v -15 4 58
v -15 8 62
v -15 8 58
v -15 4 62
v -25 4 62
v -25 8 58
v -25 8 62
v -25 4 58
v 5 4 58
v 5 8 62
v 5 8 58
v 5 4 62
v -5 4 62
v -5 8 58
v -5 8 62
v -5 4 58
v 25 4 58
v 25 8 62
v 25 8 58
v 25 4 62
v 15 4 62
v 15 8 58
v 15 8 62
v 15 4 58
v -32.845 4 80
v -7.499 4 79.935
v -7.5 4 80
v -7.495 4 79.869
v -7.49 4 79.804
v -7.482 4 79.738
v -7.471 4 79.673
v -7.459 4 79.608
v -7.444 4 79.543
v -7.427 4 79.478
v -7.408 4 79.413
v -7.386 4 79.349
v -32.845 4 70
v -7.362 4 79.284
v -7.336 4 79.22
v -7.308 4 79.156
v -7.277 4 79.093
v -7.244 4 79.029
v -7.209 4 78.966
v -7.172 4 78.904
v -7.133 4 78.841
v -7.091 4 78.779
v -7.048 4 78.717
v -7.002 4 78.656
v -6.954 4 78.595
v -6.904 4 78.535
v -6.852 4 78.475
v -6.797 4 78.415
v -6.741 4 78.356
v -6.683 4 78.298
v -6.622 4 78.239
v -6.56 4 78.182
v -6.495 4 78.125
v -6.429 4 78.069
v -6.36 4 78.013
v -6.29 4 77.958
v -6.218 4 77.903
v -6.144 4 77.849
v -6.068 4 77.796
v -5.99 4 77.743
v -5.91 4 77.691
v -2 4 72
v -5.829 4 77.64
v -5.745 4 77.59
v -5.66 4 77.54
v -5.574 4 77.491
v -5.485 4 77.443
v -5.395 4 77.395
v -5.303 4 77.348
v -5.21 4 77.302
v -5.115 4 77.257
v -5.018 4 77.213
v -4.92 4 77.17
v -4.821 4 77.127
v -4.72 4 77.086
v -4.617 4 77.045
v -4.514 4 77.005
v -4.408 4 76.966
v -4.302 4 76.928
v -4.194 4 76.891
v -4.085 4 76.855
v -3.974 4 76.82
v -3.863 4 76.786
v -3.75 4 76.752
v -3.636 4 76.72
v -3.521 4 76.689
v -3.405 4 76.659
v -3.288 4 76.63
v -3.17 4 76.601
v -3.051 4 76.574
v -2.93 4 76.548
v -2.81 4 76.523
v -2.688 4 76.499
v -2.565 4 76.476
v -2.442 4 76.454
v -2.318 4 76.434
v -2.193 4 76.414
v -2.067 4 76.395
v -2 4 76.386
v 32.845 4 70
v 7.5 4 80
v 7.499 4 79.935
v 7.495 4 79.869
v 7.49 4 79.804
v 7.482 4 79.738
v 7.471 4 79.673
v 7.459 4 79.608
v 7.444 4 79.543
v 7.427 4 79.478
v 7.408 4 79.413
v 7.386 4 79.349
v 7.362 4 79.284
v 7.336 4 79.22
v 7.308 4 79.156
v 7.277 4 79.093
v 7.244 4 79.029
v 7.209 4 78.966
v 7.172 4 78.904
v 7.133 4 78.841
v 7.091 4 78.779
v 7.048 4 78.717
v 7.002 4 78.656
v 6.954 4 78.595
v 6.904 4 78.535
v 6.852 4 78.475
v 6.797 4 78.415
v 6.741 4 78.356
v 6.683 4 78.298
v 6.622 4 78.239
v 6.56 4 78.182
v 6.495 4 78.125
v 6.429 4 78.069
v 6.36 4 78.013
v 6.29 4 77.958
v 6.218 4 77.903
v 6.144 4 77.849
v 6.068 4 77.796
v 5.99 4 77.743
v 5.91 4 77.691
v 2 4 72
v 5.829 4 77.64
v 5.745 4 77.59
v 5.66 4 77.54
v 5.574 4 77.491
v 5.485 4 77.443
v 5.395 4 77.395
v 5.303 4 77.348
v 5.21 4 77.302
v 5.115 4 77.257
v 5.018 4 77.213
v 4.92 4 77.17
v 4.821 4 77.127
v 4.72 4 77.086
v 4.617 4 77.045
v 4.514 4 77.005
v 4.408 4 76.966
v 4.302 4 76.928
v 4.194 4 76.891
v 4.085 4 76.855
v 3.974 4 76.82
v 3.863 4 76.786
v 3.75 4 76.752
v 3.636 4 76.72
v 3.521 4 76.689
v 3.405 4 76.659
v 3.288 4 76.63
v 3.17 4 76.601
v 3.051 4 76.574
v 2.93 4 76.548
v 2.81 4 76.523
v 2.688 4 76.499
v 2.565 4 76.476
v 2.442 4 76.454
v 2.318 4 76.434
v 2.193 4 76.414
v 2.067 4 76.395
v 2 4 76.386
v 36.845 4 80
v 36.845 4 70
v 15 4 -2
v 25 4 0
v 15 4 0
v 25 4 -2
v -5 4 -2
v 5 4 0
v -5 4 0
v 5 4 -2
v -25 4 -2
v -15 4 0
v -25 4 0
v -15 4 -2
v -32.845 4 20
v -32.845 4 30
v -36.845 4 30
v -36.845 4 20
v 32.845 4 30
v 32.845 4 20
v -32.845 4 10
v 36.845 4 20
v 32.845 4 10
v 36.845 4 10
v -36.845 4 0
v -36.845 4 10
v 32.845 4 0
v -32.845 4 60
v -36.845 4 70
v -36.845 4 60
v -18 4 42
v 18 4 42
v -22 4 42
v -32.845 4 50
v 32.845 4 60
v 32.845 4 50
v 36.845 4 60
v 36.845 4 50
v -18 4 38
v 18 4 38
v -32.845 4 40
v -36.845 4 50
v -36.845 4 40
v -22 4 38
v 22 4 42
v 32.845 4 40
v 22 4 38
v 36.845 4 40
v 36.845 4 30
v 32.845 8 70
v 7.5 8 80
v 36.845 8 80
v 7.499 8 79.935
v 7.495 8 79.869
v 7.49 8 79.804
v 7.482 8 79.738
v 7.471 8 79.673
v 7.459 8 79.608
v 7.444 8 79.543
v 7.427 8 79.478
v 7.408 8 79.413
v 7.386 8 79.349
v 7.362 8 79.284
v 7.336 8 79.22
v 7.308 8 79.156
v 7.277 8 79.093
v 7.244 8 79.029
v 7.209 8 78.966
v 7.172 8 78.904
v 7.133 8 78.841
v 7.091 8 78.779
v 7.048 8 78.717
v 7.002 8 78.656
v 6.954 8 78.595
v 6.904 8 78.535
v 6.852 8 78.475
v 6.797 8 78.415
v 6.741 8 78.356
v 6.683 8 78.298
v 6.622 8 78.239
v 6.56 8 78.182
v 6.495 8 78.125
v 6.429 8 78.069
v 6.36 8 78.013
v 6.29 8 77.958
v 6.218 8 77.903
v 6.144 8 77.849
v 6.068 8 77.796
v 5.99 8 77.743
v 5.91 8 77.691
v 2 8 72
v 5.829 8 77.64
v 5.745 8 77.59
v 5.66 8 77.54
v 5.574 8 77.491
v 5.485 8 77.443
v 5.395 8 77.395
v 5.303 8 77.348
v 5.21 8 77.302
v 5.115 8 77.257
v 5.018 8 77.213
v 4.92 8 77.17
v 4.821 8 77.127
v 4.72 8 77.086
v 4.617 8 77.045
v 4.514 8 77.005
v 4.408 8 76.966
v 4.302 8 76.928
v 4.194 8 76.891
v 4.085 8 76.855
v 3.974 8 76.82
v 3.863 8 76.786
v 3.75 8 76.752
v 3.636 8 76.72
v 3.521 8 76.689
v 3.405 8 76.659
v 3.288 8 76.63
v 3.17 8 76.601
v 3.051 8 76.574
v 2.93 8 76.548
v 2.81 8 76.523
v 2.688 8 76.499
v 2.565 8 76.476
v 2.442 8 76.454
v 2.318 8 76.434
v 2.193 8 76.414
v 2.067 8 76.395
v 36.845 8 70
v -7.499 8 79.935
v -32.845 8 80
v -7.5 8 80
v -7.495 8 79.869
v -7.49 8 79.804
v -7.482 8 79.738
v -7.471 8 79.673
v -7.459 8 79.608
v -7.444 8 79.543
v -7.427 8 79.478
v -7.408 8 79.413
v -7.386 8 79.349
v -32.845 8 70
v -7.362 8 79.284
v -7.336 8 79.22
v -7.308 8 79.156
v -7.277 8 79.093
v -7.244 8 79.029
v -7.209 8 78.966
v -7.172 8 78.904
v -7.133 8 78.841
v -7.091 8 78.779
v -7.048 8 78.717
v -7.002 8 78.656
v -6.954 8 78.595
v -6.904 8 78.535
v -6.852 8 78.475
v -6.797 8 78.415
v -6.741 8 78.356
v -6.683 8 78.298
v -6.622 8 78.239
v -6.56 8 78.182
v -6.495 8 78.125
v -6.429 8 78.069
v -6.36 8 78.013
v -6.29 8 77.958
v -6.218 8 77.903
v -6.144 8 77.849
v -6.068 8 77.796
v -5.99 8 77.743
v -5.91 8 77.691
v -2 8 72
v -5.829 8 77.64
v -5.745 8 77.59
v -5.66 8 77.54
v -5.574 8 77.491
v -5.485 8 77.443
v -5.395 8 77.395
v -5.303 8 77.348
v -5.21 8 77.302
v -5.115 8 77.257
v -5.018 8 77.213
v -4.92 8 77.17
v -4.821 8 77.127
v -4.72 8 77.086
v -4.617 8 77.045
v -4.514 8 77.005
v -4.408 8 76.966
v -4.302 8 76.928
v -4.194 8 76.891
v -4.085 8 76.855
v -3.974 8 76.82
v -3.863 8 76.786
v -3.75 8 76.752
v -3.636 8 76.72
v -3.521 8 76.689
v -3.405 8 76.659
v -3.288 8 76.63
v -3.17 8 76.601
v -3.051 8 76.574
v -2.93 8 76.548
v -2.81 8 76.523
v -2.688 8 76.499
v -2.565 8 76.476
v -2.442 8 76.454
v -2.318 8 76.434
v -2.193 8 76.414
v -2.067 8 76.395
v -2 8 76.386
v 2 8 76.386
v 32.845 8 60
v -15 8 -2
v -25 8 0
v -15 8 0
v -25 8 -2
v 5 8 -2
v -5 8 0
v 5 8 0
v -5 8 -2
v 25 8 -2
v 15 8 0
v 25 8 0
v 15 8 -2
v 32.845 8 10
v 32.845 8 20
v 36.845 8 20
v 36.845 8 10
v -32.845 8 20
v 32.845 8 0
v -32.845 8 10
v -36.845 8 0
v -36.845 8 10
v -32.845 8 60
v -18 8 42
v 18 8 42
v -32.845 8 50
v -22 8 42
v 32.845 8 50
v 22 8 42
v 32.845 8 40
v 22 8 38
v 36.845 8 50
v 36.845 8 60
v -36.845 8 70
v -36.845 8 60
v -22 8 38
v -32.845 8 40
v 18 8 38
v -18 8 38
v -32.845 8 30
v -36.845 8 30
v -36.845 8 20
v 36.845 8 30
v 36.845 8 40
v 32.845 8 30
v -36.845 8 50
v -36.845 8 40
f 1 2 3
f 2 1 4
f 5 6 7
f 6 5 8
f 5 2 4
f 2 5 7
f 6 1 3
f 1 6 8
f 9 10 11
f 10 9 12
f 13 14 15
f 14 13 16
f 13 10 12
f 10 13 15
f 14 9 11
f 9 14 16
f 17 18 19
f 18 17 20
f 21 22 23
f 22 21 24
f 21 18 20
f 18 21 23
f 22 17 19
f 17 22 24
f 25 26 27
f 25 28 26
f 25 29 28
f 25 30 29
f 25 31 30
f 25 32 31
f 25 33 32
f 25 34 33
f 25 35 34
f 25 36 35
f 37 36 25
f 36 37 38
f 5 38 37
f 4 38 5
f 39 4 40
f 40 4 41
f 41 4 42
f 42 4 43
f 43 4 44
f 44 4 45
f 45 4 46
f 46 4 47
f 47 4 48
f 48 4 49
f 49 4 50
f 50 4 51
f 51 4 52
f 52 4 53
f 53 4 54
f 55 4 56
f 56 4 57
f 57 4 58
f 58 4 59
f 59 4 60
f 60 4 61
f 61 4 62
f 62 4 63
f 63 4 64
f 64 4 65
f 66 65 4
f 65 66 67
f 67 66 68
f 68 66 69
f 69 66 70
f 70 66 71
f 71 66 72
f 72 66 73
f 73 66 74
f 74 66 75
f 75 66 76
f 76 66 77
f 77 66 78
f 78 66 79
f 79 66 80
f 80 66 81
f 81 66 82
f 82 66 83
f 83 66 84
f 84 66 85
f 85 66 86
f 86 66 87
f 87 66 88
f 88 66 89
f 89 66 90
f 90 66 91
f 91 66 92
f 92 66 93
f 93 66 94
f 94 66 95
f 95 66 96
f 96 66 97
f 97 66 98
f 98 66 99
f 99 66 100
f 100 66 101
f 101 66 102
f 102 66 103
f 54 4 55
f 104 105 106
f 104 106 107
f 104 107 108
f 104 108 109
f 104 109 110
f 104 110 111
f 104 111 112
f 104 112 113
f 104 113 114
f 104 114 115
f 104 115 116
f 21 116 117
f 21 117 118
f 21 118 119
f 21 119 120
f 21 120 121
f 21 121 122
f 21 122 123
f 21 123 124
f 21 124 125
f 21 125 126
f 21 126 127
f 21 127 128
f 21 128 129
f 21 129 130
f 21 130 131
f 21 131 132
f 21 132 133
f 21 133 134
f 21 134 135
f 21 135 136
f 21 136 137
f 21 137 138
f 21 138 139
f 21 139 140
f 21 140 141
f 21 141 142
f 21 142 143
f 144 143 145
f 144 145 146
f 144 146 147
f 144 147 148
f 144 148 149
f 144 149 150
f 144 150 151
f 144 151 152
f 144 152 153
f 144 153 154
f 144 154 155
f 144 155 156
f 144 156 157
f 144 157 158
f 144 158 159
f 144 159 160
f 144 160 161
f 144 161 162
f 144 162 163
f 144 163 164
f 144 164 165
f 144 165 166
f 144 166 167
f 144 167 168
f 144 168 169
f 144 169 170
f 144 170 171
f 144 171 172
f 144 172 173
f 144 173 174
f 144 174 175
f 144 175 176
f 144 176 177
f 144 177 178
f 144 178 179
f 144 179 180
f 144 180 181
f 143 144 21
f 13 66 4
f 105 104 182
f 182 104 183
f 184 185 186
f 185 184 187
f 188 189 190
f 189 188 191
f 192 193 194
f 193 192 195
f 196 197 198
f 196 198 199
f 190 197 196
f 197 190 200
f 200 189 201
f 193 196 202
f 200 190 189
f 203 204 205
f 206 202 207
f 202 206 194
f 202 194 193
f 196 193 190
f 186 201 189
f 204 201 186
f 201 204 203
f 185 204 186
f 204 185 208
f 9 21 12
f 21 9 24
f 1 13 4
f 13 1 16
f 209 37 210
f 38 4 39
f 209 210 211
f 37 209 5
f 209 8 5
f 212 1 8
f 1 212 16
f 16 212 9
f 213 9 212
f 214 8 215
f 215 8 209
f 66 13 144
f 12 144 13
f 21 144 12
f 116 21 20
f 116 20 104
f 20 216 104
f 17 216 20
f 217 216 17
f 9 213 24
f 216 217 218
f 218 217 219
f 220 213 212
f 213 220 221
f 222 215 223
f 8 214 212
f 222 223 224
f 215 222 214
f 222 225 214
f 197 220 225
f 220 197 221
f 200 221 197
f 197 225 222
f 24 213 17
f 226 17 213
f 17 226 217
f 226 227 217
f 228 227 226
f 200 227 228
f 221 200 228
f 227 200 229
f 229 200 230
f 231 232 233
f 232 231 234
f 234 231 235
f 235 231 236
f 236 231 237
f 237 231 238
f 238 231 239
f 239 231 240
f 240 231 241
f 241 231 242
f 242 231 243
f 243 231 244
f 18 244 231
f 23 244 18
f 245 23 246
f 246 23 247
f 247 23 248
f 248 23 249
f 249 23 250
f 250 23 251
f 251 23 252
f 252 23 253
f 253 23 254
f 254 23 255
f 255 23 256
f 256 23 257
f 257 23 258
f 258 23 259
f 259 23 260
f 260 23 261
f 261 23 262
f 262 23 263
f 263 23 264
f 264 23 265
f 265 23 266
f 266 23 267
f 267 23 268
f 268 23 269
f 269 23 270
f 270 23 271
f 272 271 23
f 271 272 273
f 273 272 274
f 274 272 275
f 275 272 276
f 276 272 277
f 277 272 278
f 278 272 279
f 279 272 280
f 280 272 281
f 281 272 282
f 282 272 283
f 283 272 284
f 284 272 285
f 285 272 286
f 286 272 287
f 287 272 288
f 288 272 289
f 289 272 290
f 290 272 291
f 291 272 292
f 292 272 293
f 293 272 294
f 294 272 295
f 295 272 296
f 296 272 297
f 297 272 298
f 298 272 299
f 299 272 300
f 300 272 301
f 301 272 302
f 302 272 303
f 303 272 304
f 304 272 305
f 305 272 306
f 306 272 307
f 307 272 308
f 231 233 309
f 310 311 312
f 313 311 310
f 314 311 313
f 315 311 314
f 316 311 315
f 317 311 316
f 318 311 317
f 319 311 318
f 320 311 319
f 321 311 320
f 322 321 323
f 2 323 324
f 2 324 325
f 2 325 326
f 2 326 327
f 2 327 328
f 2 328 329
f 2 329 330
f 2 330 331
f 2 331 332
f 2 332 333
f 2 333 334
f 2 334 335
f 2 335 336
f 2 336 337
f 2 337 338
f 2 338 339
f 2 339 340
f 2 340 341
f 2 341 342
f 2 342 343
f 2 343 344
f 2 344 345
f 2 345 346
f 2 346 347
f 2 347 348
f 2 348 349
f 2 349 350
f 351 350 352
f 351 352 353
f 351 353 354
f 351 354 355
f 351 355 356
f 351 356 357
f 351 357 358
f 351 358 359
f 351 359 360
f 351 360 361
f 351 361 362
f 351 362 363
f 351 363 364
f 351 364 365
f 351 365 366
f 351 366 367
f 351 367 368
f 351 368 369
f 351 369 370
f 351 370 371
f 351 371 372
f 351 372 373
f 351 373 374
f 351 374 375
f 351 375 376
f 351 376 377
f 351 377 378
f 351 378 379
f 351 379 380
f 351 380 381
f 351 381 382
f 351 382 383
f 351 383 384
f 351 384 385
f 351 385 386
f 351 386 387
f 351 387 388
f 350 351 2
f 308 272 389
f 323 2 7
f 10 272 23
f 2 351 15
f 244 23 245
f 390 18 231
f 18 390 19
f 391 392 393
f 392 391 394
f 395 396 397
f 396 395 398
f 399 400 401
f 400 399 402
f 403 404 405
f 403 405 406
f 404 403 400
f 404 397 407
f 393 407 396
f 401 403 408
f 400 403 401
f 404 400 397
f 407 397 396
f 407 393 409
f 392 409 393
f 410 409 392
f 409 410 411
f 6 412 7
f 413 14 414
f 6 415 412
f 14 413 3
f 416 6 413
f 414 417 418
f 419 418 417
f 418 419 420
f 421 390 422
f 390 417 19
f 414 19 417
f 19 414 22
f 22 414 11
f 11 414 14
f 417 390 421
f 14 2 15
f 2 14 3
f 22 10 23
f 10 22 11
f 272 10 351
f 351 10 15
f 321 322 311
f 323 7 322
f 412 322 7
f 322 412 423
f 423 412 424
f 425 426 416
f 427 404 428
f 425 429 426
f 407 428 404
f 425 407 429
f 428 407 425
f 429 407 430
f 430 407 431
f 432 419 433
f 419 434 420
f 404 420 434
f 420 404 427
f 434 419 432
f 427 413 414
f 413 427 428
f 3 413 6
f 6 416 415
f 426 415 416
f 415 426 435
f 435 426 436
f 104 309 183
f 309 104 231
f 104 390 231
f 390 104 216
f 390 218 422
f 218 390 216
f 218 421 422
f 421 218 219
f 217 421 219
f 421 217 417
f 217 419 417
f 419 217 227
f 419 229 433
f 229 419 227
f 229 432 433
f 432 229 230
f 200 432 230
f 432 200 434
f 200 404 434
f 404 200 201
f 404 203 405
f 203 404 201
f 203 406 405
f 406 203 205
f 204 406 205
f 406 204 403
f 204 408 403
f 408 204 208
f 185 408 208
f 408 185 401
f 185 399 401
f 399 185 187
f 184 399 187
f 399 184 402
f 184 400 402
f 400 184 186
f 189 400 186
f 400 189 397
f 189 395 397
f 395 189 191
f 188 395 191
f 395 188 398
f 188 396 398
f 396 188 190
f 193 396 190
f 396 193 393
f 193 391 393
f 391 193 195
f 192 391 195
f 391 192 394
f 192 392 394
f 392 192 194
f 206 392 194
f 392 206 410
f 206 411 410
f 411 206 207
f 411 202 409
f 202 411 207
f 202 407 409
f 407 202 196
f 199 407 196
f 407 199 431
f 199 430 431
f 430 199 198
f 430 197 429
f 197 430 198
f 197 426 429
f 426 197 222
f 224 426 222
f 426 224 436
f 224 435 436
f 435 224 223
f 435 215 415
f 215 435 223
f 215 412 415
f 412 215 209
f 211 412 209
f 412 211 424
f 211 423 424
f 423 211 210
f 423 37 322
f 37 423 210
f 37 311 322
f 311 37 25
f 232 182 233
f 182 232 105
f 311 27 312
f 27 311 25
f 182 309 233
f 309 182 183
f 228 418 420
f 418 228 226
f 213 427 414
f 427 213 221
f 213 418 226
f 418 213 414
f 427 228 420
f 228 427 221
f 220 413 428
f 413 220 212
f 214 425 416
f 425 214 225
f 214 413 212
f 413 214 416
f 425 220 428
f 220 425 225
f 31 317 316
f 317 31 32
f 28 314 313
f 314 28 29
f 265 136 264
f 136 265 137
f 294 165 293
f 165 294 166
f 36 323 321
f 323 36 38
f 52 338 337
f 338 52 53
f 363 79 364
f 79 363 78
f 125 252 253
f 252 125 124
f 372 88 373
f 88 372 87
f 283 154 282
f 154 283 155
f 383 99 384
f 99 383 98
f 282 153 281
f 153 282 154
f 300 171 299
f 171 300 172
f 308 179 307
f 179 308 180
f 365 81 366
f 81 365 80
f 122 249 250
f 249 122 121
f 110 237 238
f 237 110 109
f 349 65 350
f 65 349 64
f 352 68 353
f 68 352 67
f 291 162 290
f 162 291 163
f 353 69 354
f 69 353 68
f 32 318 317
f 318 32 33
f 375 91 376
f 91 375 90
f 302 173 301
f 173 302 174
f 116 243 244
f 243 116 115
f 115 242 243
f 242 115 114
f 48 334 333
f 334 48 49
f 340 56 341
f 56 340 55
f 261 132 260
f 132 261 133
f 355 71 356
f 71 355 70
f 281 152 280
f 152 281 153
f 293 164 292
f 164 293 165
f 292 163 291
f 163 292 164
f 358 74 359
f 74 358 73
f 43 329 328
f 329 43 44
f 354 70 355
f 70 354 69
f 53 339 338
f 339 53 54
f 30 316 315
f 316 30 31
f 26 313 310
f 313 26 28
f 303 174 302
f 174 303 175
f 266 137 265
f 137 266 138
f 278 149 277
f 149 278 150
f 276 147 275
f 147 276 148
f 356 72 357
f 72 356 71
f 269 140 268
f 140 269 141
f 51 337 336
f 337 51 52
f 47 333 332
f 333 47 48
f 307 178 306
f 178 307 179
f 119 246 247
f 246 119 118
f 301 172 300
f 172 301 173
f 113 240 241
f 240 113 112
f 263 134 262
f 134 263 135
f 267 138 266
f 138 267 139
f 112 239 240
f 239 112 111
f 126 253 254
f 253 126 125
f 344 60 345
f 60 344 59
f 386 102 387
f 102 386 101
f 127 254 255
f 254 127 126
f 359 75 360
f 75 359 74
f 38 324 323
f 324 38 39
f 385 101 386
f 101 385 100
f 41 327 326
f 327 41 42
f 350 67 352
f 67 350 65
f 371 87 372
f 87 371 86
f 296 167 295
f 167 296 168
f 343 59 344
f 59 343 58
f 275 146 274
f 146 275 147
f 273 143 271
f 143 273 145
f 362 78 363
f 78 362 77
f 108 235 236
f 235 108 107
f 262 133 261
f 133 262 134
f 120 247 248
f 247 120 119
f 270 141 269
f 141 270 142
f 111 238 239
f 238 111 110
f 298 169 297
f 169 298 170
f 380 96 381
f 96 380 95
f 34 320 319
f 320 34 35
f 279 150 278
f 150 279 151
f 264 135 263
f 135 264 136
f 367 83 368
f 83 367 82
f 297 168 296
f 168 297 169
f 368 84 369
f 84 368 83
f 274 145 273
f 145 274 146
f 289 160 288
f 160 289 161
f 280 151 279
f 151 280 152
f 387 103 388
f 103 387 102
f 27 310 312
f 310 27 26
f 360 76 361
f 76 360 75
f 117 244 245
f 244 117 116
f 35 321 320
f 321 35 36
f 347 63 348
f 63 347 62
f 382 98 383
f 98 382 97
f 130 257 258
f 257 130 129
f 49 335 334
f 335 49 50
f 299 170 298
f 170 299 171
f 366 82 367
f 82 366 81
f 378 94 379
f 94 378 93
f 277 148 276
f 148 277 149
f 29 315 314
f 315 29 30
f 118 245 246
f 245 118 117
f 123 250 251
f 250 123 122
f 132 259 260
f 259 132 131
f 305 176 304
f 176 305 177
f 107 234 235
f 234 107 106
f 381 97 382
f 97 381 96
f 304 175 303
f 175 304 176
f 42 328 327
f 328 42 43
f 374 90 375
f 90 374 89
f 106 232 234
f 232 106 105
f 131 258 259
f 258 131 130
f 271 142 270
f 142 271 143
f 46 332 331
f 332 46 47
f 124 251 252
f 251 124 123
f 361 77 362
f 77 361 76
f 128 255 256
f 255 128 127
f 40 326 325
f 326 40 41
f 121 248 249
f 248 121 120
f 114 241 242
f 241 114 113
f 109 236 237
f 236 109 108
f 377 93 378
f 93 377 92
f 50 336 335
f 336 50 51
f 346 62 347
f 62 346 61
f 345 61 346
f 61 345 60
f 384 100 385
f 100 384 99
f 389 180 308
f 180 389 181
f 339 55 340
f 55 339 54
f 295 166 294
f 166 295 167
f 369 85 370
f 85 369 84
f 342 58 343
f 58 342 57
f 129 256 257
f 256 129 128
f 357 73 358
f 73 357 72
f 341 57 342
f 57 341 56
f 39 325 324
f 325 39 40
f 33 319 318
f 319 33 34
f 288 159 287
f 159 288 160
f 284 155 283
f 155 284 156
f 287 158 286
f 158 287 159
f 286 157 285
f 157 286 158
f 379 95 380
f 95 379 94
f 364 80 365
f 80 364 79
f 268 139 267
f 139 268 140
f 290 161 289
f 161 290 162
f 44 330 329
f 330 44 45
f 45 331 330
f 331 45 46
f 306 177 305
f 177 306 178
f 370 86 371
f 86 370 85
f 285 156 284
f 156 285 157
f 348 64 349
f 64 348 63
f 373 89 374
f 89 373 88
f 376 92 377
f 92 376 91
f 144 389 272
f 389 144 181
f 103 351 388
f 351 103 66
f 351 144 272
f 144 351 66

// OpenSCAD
/* 
 * Stackenlichten-Files I: The top plate
 *
 * kellertuer, 2017-02-19
 */

/*
 * Variables, all Data in mm
 */
wW = 4;    // Thickness/Width of wood
mW = 4;    //                 of a Magnet-Cube
fW = 2;    // Thickness of the front plastic plate
sL = 80;   // sidelength of a triangle
bD = 80;   // Depth of a box (depth w.r.t. frontview)
fC = 3;    // number of fingers in the triangle (odd)
fD = 4;    // number on fingers downwards (even)
eW = 15; //ellipseWidth (longer arc)
// don't change these values
nC = 2*fC+2; //number of Divisions, due to 2fC+1 segments anC one segment that split in the corners
nD = 2*fD;
shortenSide = wW/tan(60)+wW/sin(90);
// concat with shfted rotated versions... bottom left right

//Generate one side

color([1,0,1]) translate([0,wW,0]) rotate(a=90,v=[1,0,0])
SLside();

module SLside() { difference() {
    midFC = (fC + 1)/2;
    SidePointLine = concat(genSide(0,[0,0], shortenSide,shortenSide+wW,fW),
    genDepth(0,[sL/2-shortenSide/2-wW,0],[0,0],wW),
    [[sL/2-shortenSide/2,-bD],[-sL/2+shortenSide/2+wW,-bD]],
    -genDepth(0,[sL/2-shortenSide/2-wW,bD],[0,0],wW)   );
  rotate(a=180,v=[1,0,0])
    linear_extrude(height=wW, twist=0) polygon(points=SidePointLine);
  // minus...
  translate([2*sL/nC,bD/2,-wW/2])
    cube(size = [mW,mW,1.02*wW], center = true);
  translate([-2*sL/nC,bD/2,-wW/2])
    cube(size = [mW,mW,1.02*wW], center = true);
  for (i = [1:fC]) {
    translate([-sL/2+2*i*sL/nC,3*bD/4,-wW/2])
      cube(size = [sL/nC,wW,1.02*wW], center = true);
  };
    translate([0,bD,-wW/2]) scale([2,1,1]) cylinder(h=1.001*wW,d=eW/2,$fn=360,center=true);
    translate([0,bD-wW,-wW/2]) cube([wW,2*wW,wW],center=true);
}}


/*
 * Helping Functions - Generate one side of the triangle recursion olé olé
 */
function genSide(a=0,v=[0,0],sLe=0,sRi=0,h=wW) = generateSide([rotM(a)*[-(sL-sLe)/2,0]+v],0,a,v,sLe,sRi,h);   
//Recursively generate fC toothes
function generateSide(pL,i,a,v,sLe,sRi,h) = (i==fC) ? concat(pL,[rotM(a)*[(sL-sRi)/2,0]+v])
    : generateSide(concat(pL,[
        rotM(a)*[-sL/2+(2*i+1.5)*sL/nC,0]+v, rotM(a)*[-sL/2+(2*i+1.5)*sL/nC,h]+v,
        rotM(a)*[-sL/2+(2*i+2.5)*sL/nC,h]+v, rotM(a)*[-sL/2+(2*i+2.5)*sL/nC,0]+v]),i+1,a,v,sLe,sRi,h);
function genDepth(a=0,v=[0,0],start=[0,0],h=wW) = generateDepth([start+v],0,a,v,h,start);
function generateDepth(pL,i,a,v,h,start) = (i==fD) ? pL
    : generateDepth(concat(pL,[
        rotM(a)*(start+[0,-(2*i+1)*bD/nD])+v, rotM(a)*(start+[h,-(2*i+1)*bD/nD])+v,
        rotM(a)*(start+[h,-(2*i+2)*bD/nD])+v, rotM(a)*(start+[0,-(2*i+2)*bD/nD])+v
        ]),i+1,a,v,h,start);
/*
 * Small Helpers
 */
function rotM(a) = [[cos(a),sin(a)],[-sin(a),cos(a)]];
